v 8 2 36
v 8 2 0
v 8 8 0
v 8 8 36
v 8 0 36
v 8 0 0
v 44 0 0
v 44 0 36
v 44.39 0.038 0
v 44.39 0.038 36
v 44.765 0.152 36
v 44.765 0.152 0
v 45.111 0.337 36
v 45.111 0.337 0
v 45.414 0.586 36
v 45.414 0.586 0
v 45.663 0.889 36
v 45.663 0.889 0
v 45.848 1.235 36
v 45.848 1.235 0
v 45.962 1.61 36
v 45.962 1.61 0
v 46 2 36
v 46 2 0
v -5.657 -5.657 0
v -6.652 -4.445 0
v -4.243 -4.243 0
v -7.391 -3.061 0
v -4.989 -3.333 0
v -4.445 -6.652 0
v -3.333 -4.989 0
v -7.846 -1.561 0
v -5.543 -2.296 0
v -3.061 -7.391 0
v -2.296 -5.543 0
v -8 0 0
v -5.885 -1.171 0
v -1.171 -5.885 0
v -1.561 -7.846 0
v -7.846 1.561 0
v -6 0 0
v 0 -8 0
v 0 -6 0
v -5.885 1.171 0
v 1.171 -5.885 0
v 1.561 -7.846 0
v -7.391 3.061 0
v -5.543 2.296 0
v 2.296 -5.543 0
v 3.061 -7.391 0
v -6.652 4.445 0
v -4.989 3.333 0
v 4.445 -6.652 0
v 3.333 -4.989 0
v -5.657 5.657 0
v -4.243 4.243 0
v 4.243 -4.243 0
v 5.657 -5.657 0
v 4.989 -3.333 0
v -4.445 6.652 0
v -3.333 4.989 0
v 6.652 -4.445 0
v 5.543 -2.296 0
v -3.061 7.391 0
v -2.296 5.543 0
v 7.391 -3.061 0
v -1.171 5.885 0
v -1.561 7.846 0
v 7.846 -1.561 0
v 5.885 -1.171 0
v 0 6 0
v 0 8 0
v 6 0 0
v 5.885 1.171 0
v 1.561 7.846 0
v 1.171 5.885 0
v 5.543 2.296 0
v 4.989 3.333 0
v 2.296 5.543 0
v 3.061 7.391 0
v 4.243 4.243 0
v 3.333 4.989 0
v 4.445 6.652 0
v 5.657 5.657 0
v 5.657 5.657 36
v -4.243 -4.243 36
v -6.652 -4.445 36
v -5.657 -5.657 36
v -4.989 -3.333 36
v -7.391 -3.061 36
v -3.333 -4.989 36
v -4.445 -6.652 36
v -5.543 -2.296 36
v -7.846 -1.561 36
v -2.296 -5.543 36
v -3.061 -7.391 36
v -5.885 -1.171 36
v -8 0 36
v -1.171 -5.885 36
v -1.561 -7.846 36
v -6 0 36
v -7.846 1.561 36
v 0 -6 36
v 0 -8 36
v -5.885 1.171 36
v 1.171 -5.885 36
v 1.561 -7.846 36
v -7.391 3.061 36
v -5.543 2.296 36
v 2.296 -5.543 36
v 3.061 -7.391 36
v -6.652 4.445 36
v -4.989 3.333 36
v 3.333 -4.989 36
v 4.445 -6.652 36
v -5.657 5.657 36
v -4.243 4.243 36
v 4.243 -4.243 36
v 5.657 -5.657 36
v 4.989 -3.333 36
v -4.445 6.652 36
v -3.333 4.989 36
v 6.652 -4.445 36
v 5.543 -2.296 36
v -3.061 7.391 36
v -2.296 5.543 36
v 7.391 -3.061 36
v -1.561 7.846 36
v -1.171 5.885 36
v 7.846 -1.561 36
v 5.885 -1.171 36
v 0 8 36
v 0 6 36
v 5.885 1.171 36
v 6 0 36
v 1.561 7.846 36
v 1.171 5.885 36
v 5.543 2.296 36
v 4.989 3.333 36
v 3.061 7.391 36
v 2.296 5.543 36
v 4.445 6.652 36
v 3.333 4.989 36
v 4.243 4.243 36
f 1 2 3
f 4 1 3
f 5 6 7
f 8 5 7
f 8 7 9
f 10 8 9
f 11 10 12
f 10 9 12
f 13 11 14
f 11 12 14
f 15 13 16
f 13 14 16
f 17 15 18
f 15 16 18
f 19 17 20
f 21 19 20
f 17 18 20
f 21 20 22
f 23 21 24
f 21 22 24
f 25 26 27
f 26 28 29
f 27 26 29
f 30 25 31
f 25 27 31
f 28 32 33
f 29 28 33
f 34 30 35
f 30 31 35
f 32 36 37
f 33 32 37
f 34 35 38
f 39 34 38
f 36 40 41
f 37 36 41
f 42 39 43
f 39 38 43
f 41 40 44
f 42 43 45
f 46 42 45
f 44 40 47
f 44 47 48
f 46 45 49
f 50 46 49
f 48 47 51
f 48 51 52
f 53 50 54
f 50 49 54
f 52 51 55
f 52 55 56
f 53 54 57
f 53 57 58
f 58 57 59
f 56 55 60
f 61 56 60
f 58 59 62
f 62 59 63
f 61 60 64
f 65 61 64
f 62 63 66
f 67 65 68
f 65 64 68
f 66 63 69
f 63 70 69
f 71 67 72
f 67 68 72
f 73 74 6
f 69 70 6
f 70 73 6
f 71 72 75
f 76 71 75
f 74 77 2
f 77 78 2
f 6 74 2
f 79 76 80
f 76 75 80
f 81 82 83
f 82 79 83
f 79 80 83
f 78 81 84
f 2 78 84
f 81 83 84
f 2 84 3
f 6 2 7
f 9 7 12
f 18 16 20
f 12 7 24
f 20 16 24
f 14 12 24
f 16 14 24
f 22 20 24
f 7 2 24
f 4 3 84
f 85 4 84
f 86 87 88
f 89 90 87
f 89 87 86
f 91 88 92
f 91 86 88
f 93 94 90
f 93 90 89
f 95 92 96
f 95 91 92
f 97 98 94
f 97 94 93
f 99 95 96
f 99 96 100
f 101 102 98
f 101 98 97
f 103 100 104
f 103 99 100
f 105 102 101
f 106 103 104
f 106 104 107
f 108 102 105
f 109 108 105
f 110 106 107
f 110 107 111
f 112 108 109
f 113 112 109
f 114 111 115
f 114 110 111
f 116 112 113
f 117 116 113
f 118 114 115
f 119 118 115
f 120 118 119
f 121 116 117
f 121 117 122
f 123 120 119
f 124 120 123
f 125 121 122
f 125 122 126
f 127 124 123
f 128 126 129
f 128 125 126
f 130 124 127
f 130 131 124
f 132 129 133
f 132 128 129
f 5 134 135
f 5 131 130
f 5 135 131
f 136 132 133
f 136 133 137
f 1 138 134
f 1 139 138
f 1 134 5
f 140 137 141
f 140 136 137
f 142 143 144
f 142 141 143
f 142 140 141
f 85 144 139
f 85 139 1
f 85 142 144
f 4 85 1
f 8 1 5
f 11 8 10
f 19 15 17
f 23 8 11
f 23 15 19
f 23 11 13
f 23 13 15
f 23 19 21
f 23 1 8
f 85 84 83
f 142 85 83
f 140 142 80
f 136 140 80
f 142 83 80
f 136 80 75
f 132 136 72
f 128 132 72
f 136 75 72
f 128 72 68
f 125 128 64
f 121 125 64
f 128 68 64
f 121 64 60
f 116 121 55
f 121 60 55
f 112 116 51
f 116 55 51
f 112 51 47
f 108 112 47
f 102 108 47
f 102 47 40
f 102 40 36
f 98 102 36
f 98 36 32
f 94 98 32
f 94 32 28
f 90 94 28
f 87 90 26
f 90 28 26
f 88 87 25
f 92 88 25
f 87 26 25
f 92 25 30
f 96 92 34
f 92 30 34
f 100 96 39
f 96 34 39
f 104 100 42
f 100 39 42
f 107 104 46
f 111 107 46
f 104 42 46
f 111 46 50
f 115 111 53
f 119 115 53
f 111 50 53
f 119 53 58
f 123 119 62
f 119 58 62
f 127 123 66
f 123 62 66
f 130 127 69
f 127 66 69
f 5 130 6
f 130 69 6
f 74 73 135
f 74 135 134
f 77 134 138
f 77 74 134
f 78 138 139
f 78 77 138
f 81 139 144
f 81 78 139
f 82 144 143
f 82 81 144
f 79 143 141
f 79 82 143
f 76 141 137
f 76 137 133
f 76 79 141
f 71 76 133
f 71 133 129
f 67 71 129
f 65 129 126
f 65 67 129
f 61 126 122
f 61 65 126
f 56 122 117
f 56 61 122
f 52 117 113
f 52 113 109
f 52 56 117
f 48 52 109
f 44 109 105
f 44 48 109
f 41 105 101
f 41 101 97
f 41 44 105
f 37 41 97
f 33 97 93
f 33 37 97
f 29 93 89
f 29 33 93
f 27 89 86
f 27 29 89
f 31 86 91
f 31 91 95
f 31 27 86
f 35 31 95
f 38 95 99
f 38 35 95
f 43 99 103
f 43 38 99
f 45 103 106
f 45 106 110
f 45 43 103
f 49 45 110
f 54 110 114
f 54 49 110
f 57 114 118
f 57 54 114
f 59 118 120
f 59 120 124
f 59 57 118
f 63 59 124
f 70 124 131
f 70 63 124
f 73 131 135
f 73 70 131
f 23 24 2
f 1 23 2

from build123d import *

# Parameters (mm, degrees)
SKETCH2_R           = 6
BOSS_EXTRUDE2_DEPTH = 36


with BuildPart() as part:
    # Sketch2 → Boss-Extrude2 (new body)
    with BuildSketch(Plane.XY):
        with BuildLine():
            Line((46, 2), (8, 2))
            Line((8, 2), (8, 8))
            Line((8, 8), (5.656854249, 5.656854249))
            ThreePointArc((5.656854249, 5.656854249), (-7.39103626, -3.061467459), (8, 0))
            Line((8, 0), (44, 0))
            ThreePointArc((44, 0), (45.414213562, 0.585786438), (46, 2))
        make_face()
        Circle(SKETCH2_R, mode=Mode.SUBTRACT)
    extrude(amount=BOSS_EXTRUDE2_DEPTH)


solid = part.part
